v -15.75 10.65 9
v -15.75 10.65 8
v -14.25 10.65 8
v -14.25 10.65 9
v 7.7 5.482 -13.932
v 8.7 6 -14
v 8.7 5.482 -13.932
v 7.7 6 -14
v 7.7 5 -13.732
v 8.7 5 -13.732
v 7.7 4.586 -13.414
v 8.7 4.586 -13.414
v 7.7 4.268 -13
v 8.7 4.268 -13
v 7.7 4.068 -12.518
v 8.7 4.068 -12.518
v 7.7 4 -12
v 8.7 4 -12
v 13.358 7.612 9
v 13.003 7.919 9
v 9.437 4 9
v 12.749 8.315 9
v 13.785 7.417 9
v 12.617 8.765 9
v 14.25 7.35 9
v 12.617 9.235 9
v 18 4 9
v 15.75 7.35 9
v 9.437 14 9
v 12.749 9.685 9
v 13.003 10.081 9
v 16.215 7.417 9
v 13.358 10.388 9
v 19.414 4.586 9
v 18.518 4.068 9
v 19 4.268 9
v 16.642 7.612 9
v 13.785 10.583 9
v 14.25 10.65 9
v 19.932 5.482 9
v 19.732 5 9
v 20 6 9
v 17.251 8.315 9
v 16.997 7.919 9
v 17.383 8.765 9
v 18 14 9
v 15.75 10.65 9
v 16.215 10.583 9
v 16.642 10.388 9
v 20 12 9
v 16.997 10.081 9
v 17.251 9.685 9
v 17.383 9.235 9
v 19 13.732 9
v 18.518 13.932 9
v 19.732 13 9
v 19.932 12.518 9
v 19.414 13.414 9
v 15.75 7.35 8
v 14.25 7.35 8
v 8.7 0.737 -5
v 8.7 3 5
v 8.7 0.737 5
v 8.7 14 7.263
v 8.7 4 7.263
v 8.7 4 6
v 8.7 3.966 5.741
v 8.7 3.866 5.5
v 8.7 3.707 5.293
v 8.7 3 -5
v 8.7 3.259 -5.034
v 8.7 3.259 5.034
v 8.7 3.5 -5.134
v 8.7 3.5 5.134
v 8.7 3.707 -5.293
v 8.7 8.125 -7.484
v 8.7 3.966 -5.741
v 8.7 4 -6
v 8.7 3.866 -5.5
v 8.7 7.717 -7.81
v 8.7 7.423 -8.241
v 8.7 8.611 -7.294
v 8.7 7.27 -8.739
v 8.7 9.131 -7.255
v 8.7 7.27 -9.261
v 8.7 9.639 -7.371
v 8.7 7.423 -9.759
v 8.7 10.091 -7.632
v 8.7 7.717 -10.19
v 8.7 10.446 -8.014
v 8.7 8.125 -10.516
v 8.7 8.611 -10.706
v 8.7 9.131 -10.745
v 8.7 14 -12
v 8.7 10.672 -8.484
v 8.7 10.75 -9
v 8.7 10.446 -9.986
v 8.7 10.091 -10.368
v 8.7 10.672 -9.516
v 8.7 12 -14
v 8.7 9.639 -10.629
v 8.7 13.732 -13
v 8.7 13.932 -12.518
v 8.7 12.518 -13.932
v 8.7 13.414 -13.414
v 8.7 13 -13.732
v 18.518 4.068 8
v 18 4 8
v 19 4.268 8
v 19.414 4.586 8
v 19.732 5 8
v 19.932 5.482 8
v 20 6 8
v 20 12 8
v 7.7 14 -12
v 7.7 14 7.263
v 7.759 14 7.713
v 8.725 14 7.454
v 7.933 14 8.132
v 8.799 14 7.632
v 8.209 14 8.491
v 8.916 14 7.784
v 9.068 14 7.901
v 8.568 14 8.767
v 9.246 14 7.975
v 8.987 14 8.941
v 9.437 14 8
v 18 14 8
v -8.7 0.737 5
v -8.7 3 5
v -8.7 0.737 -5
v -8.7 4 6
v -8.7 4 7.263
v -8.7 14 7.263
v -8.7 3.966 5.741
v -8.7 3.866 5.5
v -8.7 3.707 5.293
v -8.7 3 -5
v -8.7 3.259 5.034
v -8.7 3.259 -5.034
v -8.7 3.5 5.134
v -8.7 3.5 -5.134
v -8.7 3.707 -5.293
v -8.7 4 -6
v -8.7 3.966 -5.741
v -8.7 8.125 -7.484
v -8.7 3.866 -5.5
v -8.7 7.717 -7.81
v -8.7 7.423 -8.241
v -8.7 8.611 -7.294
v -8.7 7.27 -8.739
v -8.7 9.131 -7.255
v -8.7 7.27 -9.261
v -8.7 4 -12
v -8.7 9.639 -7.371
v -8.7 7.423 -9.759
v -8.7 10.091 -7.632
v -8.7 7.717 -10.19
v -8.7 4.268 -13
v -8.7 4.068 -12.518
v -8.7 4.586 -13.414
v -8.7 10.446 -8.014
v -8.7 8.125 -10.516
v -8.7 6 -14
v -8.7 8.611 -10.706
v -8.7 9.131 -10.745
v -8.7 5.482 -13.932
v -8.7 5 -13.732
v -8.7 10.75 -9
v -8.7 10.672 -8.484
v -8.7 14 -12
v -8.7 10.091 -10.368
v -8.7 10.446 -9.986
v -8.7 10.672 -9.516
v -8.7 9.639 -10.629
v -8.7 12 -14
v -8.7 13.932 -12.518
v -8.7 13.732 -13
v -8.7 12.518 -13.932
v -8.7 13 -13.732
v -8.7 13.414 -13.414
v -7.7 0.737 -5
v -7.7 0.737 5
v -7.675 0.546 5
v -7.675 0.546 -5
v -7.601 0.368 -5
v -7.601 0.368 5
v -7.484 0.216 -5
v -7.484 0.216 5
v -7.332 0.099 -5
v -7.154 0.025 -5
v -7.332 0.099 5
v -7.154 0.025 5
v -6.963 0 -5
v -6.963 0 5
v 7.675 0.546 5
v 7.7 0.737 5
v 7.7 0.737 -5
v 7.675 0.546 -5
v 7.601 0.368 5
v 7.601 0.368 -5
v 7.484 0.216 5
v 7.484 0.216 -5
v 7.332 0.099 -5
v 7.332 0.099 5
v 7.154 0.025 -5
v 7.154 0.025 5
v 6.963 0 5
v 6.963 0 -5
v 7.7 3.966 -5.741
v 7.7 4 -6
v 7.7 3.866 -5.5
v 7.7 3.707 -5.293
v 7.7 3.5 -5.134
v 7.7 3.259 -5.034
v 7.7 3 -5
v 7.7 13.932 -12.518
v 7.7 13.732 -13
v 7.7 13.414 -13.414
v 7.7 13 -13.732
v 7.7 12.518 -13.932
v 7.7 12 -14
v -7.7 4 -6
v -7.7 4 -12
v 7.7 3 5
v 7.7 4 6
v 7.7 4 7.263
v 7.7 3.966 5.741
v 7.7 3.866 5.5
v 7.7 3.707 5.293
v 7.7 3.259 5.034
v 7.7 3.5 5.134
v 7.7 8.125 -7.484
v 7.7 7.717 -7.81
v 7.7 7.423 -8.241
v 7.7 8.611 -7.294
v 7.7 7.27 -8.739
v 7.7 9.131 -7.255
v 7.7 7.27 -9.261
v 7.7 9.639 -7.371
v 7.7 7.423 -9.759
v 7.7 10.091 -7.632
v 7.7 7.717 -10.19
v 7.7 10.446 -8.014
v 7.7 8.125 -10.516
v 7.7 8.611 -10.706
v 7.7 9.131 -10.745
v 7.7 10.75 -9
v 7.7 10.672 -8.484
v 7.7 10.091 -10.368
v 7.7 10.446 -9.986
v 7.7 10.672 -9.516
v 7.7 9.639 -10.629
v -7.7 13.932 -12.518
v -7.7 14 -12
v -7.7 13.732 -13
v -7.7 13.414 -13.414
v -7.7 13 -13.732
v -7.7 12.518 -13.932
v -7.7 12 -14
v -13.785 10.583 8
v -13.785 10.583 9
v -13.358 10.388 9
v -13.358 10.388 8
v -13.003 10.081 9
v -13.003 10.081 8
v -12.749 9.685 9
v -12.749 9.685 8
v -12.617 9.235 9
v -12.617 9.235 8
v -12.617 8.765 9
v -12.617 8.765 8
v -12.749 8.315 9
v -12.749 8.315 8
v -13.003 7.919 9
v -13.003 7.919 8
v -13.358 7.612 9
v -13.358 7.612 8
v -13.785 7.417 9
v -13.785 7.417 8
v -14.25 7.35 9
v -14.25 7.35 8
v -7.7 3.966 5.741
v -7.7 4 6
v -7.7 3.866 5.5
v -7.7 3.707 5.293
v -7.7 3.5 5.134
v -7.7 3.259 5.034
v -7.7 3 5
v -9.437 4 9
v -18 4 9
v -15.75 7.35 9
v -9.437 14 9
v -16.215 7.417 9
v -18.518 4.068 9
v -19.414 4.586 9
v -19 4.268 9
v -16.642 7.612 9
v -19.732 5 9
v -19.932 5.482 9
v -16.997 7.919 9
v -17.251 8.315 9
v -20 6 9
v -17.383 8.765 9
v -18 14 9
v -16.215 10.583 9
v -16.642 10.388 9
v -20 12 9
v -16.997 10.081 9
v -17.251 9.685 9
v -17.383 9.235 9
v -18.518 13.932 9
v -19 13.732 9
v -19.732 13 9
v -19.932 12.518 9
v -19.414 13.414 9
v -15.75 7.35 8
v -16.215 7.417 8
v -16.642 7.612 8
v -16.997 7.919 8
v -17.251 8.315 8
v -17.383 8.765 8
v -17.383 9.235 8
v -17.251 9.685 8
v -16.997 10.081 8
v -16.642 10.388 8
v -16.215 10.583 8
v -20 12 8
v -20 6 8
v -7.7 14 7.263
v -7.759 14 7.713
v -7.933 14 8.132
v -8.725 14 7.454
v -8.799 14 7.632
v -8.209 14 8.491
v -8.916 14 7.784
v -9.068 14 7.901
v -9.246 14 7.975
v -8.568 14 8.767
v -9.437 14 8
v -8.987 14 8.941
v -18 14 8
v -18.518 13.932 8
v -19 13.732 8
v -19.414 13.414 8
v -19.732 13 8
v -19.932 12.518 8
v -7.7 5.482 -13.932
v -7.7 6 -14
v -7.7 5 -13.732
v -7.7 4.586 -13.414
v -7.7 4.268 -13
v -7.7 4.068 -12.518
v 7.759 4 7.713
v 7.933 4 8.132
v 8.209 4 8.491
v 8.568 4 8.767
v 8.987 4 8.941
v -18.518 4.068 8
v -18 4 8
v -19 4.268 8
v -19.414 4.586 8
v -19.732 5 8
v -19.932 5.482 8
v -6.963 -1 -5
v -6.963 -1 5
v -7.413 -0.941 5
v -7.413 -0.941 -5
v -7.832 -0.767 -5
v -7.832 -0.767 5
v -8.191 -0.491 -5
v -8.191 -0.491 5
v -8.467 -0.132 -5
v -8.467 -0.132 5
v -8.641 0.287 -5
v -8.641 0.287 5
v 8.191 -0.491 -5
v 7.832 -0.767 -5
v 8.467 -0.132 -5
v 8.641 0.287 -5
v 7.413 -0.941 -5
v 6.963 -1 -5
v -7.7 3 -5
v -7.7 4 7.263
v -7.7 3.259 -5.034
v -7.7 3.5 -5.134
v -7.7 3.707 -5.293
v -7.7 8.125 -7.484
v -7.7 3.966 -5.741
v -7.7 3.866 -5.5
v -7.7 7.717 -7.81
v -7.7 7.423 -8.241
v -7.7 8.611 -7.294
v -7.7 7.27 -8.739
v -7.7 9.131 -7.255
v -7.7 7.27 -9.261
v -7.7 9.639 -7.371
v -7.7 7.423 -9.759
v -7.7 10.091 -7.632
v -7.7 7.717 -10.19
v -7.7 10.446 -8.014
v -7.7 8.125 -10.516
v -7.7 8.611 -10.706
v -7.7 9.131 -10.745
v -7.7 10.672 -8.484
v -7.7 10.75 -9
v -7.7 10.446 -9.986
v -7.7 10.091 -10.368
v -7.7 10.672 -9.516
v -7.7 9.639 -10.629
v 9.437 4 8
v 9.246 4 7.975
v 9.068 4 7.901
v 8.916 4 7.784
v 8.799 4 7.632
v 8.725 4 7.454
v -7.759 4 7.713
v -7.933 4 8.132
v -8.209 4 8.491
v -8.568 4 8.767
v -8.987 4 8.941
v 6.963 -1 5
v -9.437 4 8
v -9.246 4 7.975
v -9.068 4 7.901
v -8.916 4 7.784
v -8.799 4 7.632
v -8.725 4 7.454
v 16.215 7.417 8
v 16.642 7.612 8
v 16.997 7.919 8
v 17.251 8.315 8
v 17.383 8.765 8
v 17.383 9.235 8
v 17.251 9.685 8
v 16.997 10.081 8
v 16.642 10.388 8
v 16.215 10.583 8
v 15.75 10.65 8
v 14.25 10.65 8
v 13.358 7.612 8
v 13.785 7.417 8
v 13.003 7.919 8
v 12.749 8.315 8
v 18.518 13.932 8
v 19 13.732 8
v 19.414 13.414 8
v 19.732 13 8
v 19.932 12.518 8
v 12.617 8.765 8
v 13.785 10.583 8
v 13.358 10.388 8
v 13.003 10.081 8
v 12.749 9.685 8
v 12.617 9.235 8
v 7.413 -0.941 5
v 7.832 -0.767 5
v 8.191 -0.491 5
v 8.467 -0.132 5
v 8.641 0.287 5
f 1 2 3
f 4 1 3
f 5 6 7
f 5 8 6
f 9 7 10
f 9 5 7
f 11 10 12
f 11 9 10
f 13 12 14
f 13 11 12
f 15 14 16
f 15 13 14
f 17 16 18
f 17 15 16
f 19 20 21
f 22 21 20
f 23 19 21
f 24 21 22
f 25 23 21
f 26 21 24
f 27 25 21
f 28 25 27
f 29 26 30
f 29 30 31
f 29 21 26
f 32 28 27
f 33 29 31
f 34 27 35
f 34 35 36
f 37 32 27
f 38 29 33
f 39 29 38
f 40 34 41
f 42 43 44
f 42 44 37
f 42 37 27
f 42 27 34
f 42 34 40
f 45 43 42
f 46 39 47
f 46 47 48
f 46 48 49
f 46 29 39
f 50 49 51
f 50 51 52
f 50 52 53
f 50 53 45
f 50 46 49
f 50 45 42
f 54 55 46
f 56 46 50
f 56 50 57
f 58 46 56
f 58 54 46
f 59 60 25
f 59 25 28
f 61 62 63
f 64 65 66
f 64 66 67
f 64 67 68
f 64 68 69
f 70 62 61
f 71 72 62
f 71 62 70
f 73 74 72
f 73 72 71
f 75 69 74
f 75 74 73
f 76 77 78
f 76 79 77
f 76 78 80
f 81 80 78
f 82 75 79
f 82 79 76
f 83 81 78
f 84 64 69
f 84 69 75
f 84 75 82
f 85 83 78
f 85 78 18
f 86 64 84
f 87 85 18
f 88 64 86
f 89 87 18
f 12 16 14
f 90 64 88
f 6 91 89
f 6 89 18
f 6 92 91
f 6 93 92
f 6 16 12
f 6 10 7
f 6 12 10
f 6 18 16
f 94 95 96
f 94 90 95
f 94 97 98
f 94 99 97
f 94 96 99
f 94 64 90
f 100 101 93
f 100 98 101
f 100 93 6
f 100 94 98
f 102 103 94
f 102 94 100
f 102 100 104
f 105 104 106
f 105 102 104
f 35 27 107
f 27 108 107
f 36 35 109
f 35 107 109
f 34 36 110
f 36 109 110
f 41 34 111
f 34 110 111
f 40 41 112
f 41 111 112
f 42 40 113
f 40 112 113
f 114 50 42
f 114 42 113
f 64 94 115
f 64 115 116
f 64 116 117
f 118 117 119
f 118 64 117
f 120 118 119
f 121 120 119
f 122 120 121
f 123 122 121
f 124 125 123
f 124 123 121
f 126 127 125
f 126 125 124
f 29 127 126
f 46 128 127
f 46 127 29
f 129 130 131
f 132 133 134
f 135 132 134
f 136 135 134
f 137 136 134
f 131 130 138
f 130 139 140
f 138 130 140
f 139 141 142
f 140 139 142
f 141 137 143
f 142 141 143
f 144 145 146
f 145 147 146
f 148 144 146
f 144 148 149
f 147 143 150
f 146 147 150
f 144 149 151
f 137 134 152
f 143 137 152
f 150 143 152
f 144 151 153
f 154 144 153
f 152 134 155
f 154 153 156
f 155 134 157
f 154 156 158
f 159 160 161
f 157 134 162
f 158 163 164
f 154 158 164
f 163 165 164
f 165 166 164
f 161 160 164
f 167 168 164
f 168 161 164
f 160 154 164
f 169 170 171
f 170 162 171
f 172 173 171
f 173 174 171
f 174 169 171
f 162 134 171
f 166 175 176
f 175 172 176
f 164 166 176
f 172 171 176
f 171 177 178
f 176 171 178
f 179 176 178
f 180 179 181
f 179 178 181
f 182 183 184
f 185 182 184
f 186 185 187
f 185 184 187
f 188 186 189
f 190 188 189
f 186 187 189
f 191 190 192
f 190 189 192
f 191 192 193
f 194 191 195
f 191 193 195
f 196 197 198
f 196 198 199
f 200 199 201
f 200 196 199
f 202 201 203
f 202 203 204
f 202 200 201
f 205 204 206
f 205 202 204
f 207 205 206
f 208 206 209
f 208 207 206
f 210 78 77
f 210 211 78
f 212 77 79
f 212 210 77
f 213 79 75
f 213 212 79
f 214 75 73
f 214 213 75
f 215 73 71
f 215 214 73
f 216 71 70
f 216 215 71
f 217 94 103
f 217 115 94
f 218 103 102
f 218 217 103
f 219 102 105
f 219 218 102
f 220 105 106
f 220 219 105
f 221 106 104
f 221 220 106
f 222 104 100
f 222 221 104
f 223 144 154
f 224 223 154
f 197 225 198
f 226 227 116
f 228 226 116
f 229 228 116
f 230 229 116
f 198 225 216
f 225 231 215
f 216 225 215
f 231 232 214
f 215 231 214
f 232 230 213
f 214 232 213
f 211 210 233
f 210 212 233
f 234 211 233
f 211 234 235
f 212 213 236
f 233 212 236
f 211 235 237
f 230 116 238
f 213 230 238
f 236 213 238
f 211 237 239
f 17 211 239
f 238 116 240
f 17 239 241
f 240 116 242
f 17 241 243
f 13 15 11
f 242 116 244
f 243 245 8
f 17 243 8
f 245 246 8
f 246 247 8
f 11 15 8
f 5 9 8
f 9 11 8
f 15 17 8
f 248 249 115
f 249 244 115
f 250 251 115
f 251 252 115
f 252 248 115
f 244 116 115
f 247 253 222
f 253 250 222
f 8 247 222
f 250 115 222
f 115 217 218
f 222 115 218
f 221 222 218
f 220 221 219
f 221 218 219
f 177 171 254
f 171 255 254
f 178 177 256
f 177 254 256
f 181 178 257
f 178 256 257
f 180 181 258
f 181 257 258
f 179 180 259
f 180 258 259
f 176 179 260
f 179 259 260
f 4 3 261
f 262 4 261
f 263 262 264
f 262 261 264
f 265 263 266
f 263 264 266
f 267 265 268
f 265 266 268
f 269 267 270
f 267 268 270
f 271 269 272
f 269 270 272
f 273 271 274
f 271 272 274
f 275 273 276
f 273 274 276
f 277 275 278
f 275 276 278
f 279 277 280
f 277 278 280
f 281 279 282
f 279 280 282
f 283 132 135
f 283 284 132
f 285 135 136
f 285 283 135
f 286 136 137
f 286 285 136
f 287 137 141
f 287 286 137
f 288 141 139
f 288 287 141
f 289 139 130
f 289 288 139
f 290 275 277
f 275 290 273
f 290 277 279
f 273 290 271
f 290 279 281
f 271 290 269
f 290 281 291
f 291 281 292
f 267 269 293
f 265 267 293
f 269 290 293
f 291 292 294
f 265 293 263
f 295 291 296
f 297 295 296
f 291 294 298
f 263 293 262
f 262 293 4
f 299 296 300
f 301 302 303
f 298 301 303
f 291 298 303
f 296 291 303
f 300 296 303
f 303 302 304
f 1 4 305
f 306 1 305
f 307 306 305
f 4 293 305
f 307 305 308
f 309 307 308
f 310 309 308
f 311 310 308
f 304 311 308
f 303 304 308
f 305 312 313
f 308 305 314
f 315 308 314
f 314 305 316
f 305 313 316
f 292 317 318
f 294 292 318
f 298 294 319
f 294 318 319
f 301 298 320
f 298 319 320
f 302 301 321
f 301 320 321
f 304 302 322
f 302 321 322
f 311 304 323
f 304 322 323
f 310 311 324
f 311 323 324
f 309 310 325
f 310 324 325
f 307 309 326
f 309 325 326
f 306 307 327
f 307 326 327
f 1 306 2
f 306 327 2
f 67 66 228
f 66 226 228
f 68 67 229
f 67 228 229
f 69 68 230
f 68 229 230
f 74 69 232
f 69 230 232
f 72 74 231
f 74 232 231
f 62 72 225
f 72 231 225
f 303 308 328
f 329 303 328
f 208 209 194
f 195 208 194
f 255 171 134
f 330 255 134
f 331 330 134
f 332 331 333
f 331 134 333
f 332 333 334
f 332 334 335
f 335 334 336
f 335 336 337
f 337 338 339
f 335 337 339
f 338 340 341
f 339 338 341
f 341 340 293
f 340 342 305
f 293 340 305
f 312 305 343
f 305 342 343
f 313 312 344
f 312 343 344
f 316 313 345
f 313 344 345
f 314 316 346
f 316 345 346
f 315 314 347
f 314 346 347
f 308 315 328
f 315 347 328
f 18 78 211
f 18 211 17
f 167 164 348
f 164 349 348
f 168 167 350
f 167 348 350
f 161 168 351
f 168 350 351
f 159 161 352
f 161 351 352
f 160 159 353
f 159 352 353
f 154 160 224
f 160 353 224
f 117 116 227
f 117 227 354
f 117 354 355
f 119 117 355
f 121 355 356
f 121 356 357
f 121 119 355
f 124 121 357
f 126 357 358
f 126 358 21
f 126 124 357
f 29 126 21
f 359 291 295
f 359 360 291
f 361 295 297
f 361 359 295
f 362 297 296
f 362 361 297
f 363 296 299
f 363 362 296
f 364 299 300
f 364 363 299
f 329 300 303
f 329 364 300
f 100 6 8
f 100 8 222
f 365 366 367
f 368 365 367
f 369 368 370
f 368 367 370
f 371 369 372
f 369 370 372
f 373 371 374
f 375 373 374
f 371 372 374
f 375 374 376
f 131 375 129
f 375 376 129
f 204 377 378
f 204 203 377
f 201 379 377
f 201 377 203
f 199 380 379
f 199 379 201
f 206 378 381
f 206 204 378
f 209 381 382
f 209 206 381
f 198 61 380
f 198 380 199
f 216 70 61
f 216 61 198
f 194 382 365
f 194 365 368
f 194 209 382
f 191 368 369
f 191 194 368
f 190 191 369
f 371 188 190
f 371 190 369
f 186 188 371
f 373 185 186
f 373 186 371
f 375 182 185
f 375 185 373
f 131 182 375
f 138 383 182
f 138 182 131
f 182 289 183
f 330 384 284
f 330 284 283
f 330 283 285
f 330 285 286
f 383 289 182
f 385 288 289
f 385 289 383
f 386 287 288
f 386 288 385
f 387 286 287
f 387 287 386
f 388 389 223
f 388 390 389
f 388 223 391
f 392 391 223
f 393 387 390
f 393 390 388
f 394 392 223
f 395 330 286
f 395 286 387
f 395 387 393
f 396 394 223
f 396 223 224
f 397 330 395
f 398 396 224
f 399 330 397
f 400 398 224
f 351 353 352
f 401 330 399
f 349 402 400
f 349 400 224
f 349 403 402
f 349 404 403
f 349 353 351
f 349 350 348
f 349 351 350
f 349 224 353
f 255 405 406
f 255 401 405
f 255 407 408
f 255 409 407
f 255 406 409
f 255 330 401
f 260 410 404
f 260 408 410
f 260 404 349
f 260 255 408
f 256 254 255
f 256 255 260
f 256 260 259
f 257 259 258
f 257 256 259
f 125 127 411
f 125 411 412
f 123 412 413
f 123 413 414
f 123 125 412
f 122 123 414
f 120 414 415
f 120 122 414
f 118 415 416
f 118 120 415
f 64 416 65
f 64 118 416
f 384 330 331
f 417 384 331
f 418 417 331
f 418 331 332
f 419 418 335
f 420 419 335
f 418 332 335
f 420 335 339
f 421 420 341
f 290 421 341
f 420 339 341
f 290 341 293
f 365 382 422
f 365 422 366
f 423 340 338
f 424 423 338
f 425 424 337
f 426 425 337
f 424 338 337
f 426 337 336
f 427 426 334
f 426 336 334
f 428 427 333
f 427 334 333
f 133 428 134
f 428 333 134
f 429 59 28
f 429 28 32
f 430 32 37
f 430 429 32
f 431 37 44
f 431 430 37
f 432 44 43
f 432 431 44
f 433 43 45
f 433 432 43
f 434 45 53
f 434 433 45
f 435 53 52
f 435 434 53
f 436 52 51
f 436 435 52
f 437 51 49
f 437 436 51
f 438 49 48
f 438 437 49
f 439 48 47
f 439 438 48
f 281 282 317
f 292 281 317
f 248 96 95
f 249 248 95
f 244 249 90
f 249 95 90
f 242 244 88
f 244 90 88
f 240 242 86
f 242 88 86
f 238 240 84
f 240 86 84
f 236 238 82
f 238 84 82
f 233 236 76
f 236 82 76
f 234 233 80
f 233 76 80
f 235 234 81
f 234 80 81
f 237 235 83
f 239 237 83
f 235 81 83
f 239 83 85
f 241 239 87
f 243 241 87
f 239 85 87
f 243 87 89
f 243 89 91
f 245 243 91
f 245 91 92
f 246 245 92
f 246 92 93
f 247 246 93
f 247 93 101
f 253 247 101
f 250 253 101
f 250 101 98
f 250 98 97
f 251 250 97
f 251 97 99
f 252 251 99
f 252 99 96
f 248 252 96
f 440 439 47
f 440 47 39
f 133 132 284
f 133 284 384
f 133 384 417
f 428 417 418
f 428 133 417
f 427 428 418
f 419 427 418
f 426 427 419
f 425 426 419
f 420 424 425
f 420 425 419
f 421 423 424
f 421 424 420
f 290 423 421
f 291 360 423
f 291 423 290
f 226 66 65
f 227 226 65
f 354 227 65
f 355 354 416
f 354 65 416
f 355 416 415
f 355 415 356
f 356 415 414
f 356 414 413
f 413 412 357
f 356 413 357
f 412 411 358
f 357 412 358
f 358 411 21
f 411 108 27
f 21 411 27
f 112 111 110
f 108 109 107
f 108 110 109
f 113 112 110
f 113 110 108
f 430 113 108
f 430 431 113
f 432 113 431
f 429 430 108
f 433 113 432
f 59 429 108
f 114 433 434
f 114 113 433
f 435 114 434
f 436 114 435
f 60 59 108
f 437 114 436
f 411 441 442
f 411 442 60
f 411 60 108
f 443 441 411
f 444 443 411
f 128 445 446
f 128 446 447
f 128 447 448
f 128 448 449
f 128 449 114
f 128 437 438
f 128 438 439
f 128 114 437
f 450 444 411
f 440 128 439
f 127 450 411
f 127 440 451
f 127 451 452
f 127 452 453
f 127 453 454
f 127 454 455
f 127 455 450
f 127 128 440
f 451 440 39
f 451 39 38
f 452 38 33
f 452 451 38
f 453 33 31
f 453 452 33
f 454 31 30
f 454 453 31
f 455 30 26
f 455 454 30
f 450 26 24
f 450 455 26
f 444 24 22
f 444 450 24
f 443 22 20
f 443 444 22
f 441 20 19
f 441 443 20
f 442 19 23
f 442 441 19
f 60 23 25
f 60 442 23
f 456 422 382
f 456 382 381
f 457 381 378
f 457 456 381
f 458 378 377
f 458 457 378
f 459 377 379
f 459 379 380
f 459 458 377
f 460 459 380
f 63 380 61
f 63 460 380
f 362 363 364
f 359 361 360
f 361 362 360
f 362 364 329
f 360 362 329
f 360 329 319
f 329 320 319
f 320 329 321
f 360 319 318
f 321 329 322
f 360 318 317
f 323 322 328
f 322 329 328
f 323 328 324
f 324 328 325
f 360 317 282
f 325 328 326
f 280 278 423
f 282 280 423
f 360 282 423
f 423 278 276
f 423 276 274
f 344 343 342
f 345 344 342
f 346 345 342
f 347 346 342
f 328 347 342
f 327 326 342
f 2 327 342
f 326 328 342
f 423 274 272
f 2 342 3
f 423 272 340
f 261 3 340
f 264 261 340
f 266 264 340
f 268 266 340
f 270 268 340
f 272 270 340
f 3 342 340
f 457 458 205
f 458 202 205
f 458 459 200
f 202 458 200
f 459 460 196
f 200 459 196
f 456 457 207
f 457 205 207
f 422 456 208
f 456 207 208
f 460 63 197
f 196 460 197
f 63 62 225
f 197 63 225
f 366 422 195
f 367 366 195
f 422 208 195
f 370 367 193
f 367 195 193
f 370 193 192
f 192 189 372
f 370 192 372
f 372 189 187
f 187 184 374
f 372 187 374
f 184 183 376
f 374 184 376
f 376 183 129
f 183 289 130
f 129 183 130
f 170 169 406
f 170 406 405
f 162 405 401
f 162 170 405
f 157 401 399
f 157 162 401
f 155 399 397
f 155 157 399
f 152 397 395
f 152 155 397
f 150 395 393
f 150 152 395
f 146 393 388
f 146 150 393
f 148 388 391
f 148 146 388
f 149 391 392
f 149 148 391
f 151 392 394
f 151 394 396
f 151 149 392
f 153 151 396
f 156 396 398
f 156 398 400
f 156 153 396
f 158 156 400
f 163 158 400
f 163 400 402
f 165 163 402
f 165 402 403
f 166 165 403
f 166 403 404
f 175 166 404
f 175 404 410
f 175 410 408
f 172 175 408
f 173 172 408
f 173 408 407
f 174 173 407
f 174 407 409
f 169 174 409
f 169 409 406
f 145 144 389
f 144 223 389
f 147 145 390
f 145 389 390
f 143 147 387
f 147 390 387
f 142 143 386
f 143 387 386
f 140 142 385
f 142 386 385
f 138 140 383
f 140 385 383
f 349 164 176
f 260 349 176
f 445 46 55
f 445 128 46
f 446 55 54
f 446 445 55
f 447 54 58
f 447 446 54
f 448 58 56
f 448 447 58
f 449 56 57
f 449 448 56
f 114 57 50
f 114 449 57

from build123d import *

# Parameters (mm, degrees)
SKETCH1_W                    = 7.7
SKETCH1_H                    = 10
BASE_FLANGE1_DEPTH           = 1
EDGE_FLANGE1_STRIP_W         = 5.4732
EDGE_FLANGE1_STRIP_H         = 1
EDGE_FLANGE1_STRIP_CUT_DEPTH = 10
EDGE_FLANGE1_DEPTH           = 10
SKETCH11_W                   = 23
SKETCH11_H                   = 10
TAB1_DEPTH                   = 1
FILLET1_R                    = 1
FILLET2_R                    = 2
SKETCH15_R                   = 1.75
CUT_EXTRUDE1_DEPTH           = 22.626141588
EDGE_FLANGE2_STRIP_W         = 5.4732
EDGE_FLANGE2_STRIP_H         = 1
EDGE_FLANGE2_STRIP_CUT_DEPTH = 10
EDGE_FLANGE2_DEPTH           = 10
CUT_EXTRUDE2_DEPTH           = 33.86335345
FILLET3_R                    = 2


# Sheet-metal steps are written as plain solids
with BuildPart() as part:
    # Sketch1 → Base-Flange1 (new body)
    with BuildSketch(Plane(origin=(0, 0, 0), x_dir=(1, 0, 0), z_dir=(0, 1, 0))):
        with Locations((3.85, 0)):
            Rectangle(SKETCH1_W, SKETCH1_H)
    extrude(amount=-BASE_FLANGE1_DEPTH)

    # Edge-Flange1 strip (across the edge) → Edge-Flange1 strip cut (cut)
    with BuildSketch(Plane(origin=(7.7, 0, 5), x_dir=(-1, 0, 0), z_dir=(0, 0, -1))):
        with Locations((-2, -0.5)):
            Rectangle(EDGE_FLANGE1_STRIP_W, EDGE_FLANGE1_STRIP_H)
    extrude(amount=EDGE_FLANGE1_STRIP_CUT_DEPTH, mode=Mode.SUBTRACT)

    # Edge-Flange1 section (across the edge) → Edge-Flange1 (add)
    with BuildSketch(Plane(origin=(7.7, 0, 5), x_dir=(-1, 0, 0), z_dir=(0, 0, -1))):
        with BuildLine():
            Line((-1, 0.7366), (-1, 4))
            Line((-1, 4), (0, 4))
            Line((0, 4), (0, 0.7366))
            ThreePointArc((0, 0.7366), (0.215745145, 0.215745145), (0.7366, 0))
            Line((0.7366, 0), (0.7366, -1))
            ThreePointArc((0.7366, -1), (-0.491361636, -0.491361636), (-1, 0.7366))
        make_face()
    extrude(amount=EDGE_FLANGE1_DEPTH)

    # Sketch11 → Tab1 (add)
    with BuildSketch(Plane(origin=(8.7, 0, 0), x_dir=(0, 0, -1), z_dir=(1, 0, 0))):
        with Locations((2.5, 9)):
            Rectangle(SKETCH11_W, SKETCH11_H)
    extrude(amount=-TAB1_DEPTH)

    # Fillet1
    fillet1_edges = [part.edges().sort_by_distance(p)[0] for p in [
        (8.2, 4, 5),
        (8.2, 4, -5),
    ]]
    fillet(fillet1_edges, radius=FILLET1_R)

    # Fillet2
    fillet2_edges = [part.edges().sort_by_distance(p)[0] for p in [
        (8.2, 14, -14),
        (8.2, 4, -14),
    ]]
    fillet(fillet2_edges, radius=FILLET2_R)

    # Sketch15 → Cut-Extrude1 (cut, through all)
    with BuildSketch(Plane(origin=(8.7, 0, 0), x_dir=(0, 0, -1), z_dir=(1, 0, 0))):
        with Locations(Location((9, 9, 0), (0, 0, 90))):
            Circle(SKETCH15_R)
    extrude(amount=-CUT_EXTRUDE1_DEPTH, mode=Mode.SUBTRACT)

    # Edge-Flange2 strip (across the edge) → Edge-Flange2 strip cut (cut)
    with BuildSketch(Plane(origin=(8.7, 14, 9), x_dir=(0, 0, -1), z_dir=(0, -1, 0))):
        with Locations((-1, -0.5)):
            Rectangle(EDGE_FLANGE2_STRIP_W, EDGE_FLANGE2_STRIP_H)
    extrude(amount=EDGE_FLANGE2_STRIP_CUT_DEPTH, mode=Mode.SUBTRACT)

    # Edge-Flange2 section (across the edge) → Edge-Flange2 (add)
    with BuildSketch(Plane(origin=(8.7, 14, 9), x_dir=(0, 0, -1), z_dir=(0, -1, 0))):
        with BuildLine():
            Line((0, 0.7366), (0, 11.3))
            Line((0, 11.3), (1, 11.3))
            Line((1, 11.3), (1, 0.7366))
            ThreePointArc((1, 0.7366), (1.215745145, 0.215745145), (1.7366, 0))
            Line((1.7366, 0), (1.7366, -1))
            ThreePointArc((1.7366, -1), (0.508638364, -0.491361636), (0, 0.7366))
        make_face()
    extrude(amount=EDGE_FLANGE2_DEPTH)

    # Sketch23 → Cut-Extrude2 (cut, through all)
    with BuildSketch(Plane(origin=(0, 0, 8), x_dir=(-1, 0, 0), z_dir=(0, 0, -1))):
        with BuildLine():
            Line((-15.75, 10.65), (-14.25, 10.65))
            ThreePointArc((-14.25, 10.65), (-12.6, 9), (-14.25, 7.35))
            Line((-14.25, 7.35), (-15.75, 7.35))
            ThreePointArc((-15.75, 7.35), (-17.4, 9), (-15.75, 10.65))
        make_face()
    extrude(amount=-CUT_EXTRUDE2_DEPTH, mode=Mode.SUBTRACT)

    # Fillet3
    fillet3_edges = [part.edges().sort_by_distance(p)[0] for p in [
        (20, 14, 8.5),
        (20, 4, 8.5),
    ]]
    fillet(fillet3_edges, radius=FILLET3_R)

    # Mirror1: part across plane


with BuildPart() as part_1:
    add(part.part)
    add(part.part.mirror(Plane(origin=(0, -1, -5), x_dir=(0, 0, 1), z_dir=(-1, 0, 0))))


solid = part_1.part
